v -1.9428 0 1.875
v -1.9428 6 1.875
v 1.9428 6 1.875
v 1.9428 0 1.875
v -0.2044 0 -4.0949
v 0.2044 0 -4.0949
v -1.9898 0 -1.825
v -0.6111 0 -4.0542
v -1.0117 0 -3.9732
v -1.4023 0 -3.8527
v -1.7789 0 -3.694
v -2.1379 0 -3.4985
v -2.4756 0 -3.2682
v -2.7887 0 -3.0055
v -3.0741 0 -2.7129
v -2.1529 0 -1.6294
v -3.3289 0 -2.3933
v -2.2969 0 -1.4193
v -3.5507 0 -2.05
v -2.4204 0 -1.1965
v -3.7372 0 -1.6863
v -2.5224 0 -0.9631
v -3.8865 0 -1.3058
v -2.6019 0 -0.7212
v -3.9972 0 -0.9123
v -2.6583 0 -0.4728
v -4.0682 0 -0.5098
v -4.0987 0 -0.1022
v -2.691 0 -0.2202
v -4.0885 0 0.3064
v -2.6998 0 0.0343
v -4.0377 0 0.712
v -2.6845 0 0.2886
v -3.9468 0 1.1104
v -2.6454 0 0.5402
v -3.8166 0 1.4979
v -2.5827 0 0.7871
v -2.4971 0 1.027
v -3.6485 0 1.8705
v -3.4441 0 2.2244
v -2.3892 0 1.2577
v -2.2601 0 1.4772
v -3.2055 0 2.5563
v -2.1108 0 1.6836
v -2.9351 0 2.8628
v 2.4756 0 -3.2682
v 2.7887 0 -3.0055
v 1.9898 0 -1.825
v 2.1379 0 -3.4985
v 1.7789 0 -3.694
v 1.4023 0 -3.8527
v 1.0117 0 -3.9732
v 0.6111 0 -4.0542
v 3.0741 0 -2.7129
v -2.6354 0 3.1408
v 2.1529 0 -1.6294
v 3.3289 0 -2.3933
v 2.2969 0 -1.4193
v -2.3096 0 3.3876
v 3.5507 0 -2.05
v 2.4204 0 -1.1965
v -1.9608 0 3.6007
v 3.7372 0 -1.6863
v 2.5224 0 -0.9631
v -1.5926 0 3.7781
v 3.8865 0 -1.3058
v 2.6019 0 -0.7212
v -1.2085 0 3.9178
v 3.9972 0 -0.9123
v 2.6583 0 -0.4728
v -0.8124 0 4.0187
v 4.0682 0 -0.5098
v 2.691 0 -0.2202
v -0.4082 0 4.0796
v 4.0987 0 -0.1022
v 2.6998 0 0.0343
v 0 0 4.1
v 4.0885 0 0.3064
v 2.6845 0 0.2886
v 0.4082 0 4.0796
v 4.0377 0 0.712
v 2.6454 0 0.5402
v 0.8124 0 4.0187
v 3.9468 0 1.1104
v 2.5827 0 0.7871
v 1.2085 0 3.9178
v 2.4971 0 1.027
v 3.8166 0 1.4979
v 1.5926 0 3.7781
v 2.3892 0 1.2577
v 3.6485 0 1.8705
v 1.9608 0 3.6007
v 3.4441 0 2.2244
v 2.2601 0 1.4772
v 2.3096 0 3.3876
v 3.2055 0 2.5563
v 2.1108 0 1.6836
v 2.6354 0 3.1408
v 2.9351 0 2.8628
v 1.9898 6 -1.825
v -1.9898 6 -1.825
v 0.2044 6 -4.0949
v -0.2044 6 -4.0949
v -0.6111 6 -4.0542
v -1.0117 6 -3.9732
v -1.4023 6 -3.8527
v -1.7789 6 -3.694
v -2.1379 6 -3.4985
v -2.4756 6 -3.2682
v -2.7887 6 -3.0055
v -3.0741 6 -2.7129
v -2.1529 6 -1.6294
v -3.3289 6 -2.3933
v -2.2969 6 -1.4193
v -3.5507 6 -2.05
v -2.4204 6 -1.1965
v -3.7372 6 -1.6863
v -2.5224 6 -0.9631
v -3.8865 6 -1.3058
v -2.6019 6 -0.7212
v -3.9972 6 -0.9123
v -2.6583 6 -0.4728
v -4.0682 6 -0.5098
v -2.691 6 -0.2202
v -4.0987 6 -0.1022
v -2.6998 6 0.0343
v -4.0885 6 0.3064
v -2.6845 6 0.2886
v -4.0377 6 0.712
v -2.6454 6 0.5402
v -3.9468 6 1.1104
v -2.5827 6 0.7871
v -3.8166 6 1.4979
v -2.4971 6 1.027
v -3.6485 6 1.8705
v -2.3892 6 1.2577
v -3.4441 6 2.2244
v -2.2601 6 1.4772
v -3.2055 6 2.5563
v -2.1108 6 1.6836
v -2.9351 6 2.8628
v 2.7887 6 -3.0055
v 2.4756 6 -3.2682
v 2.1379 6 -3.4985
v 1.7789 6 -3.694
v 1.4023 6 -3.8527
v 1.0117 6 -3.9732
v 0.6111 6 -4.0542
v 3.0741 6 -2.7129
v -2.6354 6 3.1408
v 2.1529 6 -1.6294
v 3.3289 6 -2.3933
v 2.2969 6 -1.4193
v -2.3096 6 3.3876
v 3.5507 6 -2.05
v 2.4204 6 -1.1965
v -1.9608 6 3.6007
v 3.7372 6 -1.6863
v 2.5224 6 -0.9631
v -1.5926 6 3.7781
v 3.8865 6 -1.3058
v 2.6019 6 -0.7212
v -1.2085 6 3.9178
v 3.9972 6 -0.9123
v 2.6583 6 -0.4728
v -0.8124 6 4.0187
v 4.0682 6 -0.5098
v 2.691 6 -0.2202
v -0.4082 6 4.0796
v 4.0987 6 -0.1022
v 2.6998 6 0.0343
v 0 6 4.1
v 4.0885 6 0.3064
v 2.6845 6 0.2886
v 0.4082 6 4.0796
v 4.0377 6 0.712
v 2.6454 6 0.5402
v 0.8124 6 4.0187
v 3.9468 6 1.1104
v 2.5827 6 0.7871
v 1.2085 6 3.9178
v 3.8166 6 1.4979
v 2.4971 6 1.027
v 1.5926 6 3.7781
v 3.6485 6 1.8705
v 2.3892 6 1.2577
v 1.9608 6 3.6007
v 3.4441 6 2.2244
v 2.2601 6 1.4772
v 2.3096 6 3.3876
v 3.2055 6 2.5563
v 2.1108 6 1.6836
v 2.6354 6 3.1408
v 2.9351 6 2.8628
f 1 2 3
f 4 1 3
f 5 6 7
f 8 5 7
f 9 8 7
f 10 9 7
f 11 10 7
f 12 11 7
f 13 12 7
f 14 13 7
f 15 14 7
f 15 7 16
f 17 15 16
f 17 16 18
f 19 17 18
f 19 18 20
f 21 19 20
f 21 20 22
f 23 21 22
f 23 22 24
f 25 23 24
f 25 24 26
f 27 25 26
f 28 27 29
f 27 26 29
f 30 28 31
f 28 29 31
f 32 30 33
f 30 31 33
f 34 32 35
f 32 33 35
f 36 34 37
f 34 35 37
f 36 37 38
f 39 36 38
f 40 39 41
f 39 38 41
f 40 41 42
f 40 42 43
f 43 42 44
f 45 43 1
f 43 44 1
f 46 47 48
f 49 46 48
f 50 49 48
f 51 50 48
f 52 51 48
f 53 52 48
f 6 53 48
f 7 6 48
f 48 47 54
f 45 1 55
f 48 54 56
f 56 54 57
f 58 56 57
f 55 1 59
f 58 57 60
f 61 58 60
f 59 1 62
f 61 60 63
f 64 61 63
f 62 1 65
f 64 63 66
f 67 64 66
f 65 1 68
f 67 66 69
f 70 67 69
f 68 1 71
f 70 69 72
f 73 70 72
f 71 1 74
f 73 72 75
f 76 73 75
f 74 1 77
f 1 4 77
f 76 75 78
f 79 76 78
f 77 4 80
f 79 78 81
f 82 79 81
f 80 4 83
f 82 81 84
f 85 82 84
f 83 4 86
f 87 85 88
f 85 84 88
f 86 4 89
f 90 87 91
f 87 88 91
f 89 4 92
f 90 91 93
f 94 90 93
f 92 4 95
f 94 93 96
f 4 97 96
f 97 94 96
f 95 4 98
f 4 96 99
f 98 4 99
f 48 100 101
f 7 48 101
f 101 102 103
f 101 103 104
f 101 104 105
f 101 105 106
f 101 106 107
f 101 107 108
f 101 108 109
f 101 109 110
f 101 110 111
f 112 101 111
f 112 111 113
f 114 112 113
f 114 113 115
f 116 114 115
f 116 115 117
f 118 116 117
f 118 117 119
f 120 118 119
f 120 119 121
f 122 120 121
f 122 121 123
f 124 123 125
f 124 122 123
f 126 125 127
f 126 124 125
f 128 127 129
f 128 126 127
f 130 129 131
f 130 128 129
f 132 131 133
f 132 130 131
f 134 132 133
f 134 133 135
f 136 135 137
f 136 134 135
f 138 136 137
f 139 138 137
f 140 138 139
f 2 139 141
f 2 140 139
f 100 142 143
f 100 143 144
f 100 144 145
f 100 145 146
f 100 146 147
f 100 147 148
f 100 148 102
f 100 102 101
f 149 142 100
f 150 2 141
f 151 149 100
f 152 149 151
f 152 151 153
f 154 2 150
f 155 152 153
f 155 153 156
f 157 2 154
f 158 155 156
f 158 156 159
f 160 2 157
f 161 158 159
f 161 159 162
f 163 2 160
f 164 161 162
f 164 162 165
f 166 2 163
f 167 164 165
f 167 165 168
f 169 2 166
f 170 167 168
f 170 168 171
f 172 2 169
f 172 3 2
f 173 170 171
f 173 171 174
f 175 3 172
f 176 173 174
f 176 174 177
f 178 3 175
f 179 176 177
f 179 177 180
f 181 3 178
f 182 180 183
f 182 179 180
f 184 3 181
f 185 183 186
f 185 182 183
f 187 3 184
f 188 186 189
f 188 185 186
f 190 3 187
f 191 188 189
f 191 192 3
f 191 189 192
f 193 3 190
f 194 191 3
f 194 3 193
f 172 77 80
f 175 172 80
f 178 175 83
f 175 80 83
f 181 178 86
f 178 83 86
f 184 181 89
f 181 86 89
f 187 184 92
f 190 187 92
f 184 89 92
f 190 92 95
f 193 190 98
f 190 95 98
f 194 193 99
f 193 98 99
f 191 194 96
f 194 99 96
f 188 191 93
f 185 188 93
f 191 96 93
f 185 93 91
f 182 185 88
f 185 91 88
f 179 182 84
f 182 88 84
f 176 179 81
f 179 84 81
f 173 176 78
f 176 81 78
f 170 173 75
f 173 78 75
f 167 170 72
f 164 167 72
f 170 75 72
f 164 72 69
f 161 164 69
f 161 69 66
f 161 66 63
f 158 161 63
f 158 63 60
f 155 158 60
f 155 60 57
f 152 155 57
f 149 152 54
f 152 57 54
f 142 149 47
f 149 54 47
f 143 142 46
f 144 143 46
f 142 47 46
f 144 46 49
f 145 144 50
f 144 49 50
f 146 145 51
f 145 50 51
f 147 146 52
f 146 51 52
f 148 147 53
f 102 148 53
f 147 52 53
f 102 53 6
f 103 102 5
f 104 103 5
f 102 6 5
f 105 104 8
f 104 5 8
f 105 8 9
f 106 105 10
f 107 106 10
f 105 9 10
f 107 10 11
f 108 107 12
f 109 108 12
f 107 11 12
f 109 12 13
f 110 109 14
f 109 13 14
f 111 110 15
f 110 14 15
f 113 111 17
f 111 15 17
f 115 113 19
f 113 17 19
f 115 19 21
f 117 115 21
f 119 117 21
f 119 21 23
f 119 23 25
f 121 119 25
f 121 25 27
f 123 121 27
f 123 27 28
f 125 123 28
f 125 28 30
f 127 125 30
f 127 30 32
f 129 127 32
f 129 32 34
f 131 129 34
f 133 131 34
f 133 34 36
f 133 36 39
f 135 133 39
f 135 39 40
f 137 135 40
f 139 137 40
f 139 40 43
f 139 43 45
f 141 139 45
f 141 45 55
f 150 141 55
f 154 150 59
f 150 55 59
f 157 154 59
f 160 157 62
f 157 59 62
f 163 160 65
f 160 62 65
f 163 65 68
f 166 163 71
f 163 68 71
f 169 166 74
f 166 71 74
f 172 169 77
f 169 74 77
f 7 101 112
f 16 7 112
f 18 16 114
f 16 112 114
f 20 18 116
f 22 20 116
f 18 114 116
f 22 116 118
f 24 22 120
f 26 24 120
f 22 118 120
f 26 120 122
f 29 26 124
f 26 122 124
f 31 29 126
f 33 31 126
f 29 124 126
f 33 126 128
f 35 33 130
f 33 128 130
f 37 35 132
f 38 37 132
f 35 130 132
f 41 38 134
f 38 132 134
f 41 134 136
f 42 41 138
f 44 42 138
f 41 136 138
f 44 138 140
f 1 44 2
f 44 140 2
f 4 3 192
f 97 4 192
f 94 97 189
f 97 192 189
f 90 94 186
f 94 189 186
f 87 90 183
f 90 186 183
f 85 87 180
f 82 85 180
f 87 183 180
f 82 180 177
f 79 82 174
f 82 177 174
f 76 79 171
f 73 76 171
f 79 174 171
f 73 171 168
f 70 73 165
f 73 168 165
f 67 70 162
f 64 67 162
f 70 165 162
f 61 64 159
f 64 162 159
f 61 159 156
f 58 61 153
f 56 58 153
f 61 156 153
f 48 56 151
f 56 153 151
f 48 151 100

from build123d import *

# Parameters (mm, degrees)
SKETCH1_R           = 4.1
BOSS_EXTRUDE1_DEPTH = 6
CUT_EXTRUDE1_DEPTH  = 8


with BuildPart() as part:
    # Sketch1 → Boss-Extrude1 (new body)
    with BuildSketch(Plane(origin=(0, 0, 0), x_dir=(1, 0, 0), z_dir=(0, 1, 0))):
        with Locations(Location((0, 0, 0), (0, 0, 270))):
            Circle(SKETCH1_R)
    extrude(amount=BOSS_EXTRUDE1_DEPTH)

    # Sketch2 → Cut-Extrude1 (cut)
    with BuildSketch(Plane(origin=(0, 6, 0), x_dir=(1, 0, 0), z_dir=(0, 1, 0))):
        with BuildLine():
            Line((1.989817831, 1.825), (-1.989817831, 1.825))
            ThreePointArc((-1.989817831, 1.825), (-2.699781796, -0.034325722), (-1.942775077, -1.875))
            Line((-1.942775077, -1.875), (1.942775077, -1.875))
            ThreePointArc((1.942775077, -1.875), (2.699781796, -0.034325722), (1.989817831, 1.825))
        make_face()
    extrude(amount=-CUT_EXTRUDE1_DEPTH, mode=Mode.SUBTRACT)


solid = part.part
